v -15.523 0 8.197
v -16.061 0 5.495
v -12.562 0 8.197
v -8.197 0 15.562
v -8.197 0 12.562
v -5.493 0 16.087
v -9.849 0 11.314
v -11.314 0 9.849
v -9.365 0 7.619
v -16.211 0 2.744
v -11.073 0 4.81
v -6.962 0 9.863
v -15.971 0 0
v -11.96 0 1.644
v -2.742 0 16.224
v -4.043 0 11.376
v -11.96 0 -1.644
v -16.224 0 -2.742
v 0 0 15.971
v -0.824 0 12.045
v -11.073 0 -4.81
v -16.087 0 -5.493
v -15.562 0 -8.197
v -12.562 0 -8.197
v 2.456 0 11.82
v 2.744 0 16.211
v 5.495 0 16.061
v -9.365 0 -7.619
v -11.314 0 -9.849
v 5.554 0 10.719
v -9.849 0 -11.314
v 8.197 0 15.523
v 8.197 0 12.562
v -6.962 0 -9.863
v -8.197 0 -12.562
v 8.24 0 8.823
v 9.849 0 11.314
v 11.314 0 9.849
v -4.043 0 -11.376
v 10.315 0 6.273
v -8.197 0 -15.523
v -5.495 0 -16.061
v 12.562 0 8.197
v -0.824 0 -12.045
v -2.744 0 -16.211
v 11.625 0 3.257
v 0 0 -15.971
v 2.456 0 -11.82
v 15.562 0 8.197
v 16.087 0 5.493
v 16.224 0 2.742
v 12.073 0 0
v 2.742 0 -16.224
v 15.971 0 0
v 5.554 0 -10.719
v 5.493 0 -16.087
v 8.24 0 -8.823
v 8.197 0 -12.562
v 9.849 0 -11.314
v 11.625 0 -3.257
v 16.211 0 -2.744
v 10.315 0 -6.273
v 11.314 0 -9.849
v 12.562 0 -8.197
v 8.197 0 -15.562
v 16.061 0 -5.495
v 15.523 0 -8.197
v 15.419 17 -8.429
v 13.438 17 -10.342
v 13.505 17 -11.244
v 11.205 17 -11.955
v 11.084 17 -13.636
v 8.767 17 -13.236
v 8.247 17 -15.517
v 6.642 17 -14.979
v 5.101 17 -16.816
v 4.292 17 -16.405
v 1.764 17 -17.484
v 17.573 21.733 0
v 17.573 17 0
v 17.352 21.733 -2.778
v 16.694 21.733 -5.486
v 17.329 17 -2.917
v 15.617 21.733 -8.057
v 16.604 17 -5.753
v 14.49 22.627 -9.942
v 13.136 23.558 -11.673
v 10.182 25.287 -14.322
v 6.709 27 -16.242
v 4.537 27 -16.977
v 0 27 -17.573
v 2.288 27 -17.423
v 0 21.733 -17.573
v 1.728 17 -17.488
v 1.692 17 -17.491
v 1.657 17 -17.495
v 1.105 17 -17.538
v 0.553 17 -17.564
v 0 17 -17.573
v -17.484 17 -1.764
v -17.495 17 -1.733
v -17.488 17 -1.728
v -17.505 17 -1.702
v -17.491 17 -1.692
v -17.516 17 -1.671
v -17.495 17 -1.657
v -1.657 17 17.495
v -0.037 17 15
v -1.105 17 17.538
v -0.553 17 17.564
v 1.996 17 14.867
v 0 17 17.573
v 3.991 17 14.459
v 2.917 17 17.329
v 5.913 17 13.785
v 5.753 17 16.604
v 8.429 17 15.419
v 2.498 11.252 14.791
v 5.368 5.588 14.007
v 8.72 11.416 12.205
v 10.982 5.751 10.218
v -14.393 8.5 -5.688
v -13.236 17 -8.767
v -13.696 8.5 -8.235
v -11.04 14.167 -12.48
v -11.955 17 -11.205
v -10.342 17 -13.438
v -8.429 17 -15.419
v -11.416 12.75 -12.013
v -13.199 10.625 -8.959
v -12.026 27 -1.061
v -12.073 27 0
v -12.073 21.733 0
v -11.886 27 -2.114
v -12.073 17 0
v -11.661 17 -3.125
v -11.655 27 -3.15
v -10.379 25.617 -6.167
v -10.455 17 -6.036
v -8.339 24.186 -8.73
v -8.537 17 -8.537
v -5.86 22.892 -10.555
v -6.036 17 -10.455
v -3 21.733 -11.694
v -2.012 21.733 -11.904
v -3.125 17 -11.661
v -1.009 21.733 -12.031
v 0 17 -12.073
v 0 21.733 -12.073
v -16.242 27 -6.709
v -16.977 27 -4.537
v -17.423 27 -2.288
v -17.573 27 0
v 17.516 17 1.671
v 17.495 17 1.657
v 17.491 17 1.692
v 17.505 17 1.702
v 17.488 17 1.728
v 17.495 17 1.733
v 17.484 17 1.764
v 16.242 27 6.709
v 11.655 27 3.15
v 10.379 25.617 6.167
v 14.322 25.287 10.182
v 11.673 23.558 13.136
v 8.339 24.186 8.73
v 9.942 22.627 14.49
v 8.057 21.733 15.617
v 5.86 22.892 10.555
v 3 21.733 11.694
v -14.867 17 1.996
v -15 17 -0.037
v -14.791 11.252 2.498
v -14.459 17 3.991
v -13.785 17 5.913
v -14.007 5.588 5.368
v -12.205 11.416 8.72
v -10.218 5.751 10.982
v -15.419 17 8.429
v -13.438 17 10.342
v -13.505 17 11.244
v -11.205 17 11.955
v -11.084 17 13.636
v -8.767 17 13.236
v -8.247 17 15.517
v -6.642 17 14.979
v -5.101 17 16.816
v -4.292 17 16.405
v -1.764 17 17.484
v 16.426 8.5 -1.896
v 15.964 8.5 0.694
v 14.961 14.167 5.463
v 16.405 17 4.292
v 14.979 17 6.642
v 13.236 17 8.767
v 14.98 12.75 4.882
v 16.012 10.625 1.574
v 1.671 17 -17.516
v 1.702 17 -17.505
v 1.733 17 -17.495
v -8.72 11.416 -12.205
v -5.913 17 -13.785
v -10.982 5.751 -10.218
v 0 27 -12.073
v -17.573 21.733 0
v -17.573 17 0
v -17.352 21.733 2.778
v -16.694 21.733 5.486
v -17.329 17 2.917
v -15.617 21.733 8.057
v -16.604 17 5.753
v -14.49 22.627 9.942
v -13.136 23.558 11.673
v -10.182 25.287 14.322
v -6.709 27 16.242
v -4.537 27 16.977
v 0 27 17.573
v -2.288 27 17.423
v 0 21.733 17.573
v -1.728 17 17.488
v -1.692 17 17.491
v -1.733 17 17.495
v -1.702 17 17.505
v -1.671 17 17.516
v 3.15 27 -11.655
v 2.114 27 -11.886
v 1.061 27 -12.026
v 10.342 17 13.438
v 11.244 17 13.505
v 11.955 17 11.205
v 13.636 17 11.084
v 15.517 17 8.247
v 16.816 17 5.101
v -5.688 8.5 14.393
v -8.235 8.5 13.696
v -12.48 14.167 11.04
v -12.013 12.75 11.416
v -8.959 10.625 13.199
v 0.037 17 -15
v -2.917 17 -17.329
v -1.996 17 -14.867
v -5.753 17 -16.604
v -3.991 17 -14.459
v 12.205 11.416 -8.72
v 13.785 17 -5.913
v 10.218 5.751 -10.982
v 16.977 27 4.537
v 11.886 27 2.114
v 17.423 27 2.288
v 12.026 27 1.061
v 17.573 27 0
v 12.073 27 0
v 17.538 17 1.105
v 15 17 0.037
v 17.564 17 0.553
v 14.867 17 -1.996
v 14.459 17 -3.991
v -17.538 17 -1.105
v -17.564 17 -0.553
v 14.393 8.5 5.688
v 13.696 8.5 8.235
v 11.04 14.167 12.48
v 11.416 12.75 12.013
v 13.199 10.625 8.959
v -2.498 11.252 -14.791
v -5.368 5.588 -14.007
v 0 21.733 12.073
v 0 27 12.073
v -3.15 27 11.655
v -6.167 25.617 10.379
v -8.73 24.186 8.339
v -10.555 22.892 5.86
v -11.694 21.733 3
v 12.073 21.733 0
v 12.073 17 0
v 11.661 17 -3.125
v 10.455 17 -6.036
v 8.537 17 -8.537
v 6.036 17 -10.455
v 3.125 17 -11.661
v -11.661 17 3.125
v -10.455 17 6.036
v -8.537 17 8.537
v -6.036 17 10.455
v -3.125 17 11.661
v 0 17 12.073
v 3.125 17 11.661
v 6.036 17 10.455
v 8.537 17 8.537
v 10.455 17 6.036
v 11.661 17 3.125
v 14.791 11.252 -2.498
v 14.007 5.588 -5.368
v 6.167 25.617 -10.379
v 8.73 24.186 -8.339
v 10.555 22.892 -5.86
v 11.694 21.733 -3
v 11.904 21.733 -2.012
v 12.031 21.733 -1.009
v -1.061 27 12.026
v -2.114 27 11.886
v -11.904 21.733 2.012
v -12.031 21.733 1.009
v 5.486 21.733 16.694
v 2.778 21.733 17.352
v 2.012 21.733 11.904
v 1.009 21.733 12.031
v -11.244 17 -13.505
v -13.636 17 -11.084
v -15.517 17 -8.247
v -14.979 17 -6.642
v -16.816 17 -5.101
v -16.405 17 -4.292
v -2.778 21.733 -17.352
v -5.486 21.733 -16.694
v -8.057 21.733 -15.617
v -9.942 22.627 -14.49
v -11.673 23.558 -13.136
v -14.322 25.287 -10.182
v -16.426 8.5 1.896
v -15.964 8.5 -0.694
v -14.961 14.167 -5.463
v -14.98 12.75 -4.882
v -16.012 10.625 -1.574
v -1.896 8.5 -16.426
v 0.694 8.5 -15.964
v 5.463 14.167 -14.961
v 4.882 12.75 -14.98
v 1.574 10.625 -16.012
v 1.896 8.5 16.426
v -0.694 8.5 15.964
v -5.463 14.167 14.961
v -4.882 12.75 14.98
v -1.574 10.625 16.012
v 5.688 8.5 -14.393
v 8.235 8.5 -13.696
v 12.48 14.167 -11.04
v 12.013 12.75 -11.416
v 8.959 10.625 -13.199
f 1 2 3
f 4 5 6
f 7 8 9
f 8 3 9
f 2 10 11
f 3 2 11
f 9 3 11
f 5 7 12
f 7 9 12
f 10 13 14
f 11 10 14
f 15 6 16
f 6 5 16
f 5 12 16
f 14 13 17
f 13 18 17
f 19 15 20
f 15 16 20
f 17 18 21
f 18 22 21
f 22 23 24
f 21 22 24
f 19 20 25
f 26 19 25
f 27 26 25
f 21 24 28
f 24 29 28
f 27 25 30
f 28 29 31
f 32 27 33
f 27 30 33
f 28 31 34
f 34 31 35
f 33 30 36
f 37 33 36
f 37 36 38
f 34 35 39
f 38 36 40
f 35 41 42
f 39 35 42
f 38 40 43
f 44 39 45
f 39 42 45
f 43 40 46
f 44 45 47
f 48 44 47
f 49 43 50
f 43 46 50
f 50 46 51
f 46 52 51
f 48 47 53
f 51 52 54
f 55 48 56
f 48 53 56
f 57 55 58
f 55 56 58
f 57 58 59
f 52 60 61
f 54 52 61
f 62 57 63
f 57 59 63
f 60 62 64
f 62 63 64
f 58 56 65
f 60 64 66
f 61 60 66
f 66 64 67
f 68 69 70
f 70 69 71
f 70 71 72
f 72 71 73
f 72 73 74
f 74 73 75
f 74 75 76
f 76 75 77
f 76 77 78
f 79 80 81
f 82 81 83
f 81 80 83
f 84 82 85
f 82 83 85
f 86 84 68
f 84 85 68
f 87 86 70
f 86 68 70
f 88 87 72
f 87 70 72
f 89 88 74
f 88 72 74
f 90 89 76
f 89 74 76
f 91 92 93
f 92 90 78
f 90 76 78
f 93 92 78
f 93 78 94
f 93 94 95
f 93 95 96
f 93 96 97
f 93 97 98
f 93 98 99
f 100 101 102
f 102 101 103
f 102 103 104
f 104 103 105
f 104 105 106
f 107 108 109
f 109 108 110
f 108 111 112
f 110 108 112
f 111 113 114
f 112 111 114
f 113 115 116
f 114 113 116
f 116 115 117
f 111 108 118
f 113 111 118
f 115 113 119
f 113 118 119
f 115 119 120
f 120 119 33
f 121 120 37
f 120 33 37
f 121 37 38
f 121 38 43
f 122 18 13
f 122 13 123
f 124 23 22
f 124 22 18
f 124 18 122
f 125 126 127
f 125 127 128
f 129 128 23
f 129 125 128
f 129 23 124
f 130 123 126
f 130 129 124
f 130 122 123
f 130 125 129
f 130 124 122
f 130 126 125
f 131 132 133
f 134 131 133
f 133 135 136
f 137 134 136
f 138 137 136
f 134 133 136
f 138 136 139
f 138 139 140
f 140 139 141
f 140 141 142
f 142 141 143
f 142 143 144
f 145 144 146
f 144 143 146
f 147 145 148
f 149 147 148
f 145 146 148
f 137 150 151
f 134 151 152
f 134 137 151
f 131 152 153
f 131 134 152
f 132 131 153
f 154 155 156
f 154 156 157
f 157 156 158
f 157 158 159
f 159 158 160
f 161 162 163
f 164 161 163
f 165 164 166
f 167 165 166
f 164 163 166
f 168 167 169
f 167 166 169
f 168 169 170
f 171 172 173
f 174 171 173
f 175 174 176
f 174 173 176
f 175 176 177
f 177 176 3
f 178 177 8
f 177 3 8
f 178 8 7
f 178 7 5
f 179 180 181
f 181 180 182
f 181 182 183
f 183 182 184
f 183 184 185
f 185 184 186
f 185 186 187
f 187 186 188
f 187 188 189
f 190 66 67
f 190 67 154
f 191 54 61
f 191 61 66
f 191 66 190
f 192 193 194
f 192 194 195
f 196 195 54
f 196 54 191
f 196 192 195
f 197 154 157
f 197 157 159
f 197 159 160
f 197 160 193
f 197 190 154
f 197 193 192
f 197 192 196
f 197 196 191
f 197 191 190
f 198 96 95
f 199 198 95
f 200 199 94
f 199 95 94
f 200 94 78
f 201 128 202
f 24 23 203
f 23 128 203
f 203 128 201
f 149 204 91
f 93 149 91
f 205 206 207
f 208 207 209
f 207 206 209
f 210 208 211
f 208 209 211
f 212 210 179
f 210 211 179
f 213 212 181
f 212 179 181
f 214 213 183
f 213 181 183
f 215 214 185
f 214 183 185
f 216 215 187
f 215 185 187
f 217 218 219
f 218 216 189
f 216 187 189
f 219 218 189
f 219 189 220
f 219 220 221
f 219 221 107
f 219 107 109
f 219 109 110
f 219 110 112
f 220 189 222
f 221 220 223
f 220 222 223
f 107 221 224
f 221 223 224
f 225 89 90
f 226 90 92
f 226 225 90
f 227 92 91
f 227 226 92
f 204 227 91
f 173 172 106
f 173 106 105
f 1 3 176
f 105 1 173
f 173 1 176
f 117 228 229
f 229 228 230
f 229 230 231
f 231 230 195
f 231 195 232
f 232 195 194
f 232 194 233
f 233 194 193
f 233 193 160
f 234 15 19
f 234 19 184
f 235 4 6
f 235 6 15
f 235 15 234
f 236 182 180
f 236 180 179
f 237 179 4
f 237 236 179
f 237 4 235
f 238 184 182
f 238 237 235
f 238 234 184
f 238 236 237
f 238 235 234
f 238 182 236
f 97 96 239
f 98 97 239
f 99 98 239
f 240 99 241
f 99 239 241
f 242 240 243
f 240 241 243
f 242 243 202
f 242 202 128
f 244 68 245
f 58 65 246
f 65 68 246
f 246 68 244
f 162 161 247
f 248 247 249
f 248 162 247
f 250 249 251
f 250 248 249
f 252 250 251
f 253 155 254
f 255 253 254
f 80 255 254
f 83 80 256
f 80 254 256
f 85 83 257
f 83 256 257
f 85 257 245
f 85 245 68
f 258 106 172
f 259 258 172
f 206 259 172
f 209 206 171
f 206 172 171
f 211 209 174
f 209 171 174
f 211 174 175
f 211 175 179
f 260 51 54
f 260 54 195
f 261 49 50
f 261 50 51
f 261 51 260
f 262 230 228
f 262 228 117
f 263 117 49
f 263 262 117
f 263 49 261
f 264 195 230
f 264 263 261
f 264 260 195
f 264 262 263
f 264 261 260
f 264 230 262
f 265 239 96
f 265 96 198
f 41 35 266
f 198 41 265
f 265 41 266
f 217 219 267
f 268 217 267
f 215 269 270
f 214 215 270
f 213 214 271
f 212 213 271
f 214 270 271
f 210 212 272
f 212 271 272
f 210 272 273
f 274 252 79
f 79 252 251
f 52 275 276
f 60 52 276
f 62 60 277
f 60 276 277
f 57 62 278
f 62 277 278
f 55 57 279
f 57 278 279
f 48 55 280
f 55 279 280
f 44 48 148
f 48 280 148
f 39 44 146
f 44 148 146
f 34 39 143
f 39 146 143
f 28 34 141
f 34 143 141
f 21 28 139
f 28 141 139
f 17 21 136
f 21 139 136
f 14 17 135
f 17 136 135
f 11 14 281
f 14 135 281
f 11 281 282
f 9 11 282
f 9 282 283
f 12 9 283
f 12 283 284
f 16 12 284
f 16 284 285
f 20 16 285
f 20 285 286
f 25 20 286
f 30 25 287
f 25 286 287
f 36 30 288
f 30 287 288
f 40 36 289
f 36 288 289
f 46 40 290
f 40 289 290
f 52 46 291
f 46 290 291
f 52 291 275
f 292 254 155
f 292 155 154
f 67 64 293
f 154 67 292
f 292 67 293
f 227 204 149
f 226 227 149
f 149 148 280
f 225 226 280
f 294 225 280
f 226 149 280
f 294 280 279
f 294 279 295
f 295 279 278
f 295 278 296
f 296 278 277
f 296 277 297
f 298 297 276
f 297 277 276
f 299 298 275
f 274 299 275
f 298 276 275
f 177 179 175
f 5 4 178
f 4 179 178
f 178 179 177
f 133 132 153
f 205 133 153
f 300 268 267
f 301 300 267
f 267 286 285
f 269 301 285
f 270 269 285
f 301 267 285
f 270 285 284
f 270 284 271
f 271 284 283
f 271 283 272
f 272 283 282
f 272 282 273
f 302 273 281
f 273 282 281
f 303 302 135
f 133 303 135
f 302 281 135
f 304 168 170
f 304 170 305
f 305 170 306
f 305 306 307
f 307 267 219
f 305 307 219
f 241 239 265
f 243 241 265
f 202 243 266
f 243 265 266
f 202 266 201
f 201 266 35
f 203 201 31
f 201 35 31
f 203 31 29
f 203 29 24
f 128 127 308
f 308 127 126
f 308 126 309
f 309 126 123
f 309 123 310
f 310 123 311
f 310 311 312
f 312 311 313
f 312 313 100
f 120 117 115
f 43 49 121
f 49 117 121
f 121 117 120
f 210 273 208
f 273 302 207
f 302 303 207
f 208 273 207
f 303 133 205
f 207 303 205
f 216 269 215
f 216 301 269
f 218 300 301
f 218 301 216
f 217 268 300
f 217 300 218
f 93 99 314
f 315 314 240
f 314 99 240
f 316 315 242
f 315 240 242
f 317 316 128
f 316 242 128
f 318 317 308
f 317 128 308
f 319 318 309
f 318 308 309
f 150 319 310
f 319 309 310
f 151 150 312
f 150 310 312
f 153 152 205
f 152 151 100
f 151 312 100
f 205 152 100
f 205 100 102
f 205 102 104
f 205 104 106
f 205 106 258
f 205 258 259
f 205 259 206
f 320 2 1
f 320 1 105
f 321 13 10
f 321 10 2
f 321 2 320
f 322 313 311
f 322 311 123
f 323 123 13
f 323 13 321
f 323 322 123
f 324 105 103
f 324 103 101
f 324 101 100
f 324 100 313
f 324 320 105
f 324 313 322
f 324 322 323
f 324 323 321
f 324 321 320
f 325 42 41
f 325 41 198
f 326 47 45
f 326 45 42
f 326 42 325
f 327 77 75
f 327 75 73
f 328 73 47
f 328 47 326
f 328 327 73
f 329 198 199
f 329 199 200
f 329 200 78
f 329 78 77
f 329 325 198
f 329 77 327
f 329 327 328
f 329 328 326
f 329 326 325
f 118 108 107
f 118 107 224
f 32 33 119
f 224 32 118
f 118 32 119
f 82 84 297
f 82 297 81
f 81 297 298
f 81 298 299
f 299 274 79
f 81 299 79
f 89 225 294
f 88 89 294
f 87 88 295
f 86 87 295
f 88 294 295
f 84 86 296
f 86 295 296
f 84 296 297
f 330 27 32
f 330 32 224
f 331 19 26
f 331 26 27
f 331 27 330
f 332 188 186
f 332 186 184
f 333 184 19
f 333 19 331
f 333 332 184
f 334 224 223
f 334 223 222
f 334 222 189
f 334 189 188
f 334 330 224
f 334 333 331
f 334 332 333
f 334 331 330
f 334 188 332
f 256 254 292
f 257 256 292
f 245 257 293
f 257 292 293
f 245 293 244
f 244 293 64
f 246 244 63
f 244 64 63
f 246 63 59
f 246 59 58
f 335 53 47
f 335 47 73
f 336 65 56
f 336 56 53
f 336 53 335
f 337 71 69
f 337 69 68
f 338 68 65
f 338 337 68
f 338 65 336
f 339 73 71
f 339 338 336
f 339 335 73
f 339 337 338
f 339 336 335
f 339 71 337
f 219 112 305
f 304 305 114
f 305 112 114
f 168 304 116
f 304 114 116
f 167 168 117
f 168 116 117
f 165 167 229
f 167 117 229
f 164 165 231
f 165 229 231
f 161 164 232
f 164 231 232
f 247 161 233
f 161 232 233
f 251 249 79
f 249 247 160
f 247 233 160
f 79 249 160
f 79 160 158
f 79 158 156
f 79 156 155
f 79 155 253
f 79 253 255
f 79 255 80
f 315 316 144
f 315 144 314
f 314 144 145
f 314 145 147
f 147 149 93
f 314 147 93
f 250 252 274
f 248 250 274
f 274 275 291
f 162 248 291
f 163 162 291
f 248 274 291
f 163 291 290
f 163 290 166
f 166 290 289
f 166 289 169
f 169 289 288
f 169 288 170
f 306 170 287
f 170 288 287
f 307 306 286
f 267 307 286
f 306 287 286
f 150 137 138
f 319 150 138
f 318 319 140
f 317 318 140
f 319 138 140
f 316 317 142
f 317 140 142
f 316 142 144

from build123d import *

# Parameters (mm, degrees)
SKETCH1_R           = 15
BOSS_EXTRUDE1_DEPTH = 17
CIRPATTERN1_COUNT   = 4
BOSS_EXTRUDE3_DEPTH = 10
SKETCH12_W          = 14.047466192
SKETCH12_H          = 9.954867113
CUT_EXTRUDE2_DEPTH  = 3
CUT_EXTRUDE3_DEPTH  = 9
CIRPATTERN11_COUNT  = 4
SKETCH14_R          = 12.072799678
CUT_EXTRUDE4_DEPTH  = 24


with BuildPart() as part:
    # Sketch1 → Boss-Extrude1 (new body)
    with BuildSketch(Plane(origin=(0, 0, 0), x_dir=(1, 0, 0), z_dir=(0, 1, 0))):
        Circle(SKETCH1_R)
    extrude(amount=BOSS_EXTRUDE1_DEPTH)

    # Sketch7 → Loft3 section 0
    with BuildSketch(Plane(origin=(0, 17, 0), x_dir=(1, 0, 0), z_dir=(0, 1, 0))):
        with BuildLine():
            Line((-15.419212864, -8.429185203), (-13.785295759, -5.913173499))
            Line((-13.785295759, -5.913173499), (-0.036662397, -14.999955196))
            Line((-0.036662397, -14.999955196), (-1.670579502, -17.515966899))
            ThreePointArc((-1.670579502, -17.515966899), (-5.449846484, -15.759052669), (-8.767392344, -13.236455593))
            ThreePointArc((-8.767392344, -13.236455593), (-12.350066375, -11.188104454), (-15.419212864, -8.429185203))
        make_face()
    # Sketch2 → Loft3 section 1
    with BuildSketch(Plane.XZ):
        with BuildLine():
            Line((8.1969132, 15.523322087), (8.1969132, 12.562269461))
            Line((8.1969132, 12.562269461), (-8.1969132, 12.562269461))
            Line((-8.1969132, 12.562269461), (-8.1969132, 15.562269461))
            ThreePointArc((-8.1969132, 15.562269461), (-4.120295252, 16.204516854), (0, 15.971144539))
            ThreePointArc((0, 15.971144539), (4.122381552, 16.185154095), (8.1969132, 15.523322087))
        make_face()
    loft3 = loft()

    # CirPattern1: Loft3 ×4 about axis
    cirpattern1_axis = Axis((0, 0, 0), (0, -1, 0))
    for i in range(1, CIRPATTERN1_COUNT):
        add(loft3.rotate(cirpattern1_axis, i * 360 / CIRPATTERN1_COUNT))

    # Sketch8 → Boss-Extrude3 (add)
    with BuildSketch(Plane(origin=(0, 17, 0), x_dir=(1, 0, 0), z_dir=(0, 1, 0))):
        with BuildLine():
            Line((17.572799678, 0), (12.072799678, 0))
            ThreePointArc((12.072799678, 0), (8.536758521, -8.536758521), (0, -12.072799678))
            Line((0, -12.072799678), (0, -17.572799678))
            ThreePointArc((0, -17.572799678), (12.425845817, -12.425845817), (17.572799678, 0))
        make_face()
    boss_extrude3 = extrude(amount=BOSS_EXTRUDE3_DEPTH)

    # Sketch12 → Cut-Extrude2 (cut)
    with BuildSketch(Plane.ZY):
        with Locations((15, 26.710348928)):
            Rectangle(SKETCH12_W, SKETCH12_H)
    cut_extrude2 = extrude(amount=-CUT_EXTRUDE2_DEPTH, mode=Mode.SUBTRACT)

    # Sketch13 → Cut-Extrude3 (cut)
    with BuildSketch(Plane(origin=(7.536399839, 0, 5.847061058), x_dir=(-0.612987567, 0, 0.790092553), z_dir=(-0.790092553, 0, -0.612987567))):
        Polygon((-4.655510065, 27), (7.400476101, 21.732915371), (11.841354417, 21.732915371), (11.841354417, 27), align=None)
    cut_extrude3 = extrude(amount=-CUT_EXTRUDE3_DEPTH, mode=Mode.SUBTRACT)

    # CirPattern11: Boss-Extrude3, Cut-Extrude2, Cut-Extrude3 ×4 about axis
    cirpattern11_axis = Axis((0, 0, 0), (0, 1, 0))
    for i in range(1, CIRPATTERN11_COUNT):
        add(boss_extrude3.rotate(cirpattern11_axis, i * 360 / CIRPATTERN11_COUNT))
        add(cut_extrude2.rotate(cirpattern11_axis, i * 360 / CIRPATTERN11_COUNT), mode=Mode.SUBTRACT)
        add(cut_extrude3.rotate(cirpattern11_axis, i * 360 / CIRPATTERN11_COUNT), mode=Mode.SUBTRACT)

    # Sketch14 → Cut-Extrude4 (cut)
    with BuildSketch(Plane(origin=(0, 17, 0), x_dir=(1, 0, 0), z_dir=(0, 1, 0))):
        Circle(SKETCH14_R)
    extrude(amount=-CUT_EXTRUDE4_DEPTH, mode=Mode.SUBTRACT)


solid = part.part
